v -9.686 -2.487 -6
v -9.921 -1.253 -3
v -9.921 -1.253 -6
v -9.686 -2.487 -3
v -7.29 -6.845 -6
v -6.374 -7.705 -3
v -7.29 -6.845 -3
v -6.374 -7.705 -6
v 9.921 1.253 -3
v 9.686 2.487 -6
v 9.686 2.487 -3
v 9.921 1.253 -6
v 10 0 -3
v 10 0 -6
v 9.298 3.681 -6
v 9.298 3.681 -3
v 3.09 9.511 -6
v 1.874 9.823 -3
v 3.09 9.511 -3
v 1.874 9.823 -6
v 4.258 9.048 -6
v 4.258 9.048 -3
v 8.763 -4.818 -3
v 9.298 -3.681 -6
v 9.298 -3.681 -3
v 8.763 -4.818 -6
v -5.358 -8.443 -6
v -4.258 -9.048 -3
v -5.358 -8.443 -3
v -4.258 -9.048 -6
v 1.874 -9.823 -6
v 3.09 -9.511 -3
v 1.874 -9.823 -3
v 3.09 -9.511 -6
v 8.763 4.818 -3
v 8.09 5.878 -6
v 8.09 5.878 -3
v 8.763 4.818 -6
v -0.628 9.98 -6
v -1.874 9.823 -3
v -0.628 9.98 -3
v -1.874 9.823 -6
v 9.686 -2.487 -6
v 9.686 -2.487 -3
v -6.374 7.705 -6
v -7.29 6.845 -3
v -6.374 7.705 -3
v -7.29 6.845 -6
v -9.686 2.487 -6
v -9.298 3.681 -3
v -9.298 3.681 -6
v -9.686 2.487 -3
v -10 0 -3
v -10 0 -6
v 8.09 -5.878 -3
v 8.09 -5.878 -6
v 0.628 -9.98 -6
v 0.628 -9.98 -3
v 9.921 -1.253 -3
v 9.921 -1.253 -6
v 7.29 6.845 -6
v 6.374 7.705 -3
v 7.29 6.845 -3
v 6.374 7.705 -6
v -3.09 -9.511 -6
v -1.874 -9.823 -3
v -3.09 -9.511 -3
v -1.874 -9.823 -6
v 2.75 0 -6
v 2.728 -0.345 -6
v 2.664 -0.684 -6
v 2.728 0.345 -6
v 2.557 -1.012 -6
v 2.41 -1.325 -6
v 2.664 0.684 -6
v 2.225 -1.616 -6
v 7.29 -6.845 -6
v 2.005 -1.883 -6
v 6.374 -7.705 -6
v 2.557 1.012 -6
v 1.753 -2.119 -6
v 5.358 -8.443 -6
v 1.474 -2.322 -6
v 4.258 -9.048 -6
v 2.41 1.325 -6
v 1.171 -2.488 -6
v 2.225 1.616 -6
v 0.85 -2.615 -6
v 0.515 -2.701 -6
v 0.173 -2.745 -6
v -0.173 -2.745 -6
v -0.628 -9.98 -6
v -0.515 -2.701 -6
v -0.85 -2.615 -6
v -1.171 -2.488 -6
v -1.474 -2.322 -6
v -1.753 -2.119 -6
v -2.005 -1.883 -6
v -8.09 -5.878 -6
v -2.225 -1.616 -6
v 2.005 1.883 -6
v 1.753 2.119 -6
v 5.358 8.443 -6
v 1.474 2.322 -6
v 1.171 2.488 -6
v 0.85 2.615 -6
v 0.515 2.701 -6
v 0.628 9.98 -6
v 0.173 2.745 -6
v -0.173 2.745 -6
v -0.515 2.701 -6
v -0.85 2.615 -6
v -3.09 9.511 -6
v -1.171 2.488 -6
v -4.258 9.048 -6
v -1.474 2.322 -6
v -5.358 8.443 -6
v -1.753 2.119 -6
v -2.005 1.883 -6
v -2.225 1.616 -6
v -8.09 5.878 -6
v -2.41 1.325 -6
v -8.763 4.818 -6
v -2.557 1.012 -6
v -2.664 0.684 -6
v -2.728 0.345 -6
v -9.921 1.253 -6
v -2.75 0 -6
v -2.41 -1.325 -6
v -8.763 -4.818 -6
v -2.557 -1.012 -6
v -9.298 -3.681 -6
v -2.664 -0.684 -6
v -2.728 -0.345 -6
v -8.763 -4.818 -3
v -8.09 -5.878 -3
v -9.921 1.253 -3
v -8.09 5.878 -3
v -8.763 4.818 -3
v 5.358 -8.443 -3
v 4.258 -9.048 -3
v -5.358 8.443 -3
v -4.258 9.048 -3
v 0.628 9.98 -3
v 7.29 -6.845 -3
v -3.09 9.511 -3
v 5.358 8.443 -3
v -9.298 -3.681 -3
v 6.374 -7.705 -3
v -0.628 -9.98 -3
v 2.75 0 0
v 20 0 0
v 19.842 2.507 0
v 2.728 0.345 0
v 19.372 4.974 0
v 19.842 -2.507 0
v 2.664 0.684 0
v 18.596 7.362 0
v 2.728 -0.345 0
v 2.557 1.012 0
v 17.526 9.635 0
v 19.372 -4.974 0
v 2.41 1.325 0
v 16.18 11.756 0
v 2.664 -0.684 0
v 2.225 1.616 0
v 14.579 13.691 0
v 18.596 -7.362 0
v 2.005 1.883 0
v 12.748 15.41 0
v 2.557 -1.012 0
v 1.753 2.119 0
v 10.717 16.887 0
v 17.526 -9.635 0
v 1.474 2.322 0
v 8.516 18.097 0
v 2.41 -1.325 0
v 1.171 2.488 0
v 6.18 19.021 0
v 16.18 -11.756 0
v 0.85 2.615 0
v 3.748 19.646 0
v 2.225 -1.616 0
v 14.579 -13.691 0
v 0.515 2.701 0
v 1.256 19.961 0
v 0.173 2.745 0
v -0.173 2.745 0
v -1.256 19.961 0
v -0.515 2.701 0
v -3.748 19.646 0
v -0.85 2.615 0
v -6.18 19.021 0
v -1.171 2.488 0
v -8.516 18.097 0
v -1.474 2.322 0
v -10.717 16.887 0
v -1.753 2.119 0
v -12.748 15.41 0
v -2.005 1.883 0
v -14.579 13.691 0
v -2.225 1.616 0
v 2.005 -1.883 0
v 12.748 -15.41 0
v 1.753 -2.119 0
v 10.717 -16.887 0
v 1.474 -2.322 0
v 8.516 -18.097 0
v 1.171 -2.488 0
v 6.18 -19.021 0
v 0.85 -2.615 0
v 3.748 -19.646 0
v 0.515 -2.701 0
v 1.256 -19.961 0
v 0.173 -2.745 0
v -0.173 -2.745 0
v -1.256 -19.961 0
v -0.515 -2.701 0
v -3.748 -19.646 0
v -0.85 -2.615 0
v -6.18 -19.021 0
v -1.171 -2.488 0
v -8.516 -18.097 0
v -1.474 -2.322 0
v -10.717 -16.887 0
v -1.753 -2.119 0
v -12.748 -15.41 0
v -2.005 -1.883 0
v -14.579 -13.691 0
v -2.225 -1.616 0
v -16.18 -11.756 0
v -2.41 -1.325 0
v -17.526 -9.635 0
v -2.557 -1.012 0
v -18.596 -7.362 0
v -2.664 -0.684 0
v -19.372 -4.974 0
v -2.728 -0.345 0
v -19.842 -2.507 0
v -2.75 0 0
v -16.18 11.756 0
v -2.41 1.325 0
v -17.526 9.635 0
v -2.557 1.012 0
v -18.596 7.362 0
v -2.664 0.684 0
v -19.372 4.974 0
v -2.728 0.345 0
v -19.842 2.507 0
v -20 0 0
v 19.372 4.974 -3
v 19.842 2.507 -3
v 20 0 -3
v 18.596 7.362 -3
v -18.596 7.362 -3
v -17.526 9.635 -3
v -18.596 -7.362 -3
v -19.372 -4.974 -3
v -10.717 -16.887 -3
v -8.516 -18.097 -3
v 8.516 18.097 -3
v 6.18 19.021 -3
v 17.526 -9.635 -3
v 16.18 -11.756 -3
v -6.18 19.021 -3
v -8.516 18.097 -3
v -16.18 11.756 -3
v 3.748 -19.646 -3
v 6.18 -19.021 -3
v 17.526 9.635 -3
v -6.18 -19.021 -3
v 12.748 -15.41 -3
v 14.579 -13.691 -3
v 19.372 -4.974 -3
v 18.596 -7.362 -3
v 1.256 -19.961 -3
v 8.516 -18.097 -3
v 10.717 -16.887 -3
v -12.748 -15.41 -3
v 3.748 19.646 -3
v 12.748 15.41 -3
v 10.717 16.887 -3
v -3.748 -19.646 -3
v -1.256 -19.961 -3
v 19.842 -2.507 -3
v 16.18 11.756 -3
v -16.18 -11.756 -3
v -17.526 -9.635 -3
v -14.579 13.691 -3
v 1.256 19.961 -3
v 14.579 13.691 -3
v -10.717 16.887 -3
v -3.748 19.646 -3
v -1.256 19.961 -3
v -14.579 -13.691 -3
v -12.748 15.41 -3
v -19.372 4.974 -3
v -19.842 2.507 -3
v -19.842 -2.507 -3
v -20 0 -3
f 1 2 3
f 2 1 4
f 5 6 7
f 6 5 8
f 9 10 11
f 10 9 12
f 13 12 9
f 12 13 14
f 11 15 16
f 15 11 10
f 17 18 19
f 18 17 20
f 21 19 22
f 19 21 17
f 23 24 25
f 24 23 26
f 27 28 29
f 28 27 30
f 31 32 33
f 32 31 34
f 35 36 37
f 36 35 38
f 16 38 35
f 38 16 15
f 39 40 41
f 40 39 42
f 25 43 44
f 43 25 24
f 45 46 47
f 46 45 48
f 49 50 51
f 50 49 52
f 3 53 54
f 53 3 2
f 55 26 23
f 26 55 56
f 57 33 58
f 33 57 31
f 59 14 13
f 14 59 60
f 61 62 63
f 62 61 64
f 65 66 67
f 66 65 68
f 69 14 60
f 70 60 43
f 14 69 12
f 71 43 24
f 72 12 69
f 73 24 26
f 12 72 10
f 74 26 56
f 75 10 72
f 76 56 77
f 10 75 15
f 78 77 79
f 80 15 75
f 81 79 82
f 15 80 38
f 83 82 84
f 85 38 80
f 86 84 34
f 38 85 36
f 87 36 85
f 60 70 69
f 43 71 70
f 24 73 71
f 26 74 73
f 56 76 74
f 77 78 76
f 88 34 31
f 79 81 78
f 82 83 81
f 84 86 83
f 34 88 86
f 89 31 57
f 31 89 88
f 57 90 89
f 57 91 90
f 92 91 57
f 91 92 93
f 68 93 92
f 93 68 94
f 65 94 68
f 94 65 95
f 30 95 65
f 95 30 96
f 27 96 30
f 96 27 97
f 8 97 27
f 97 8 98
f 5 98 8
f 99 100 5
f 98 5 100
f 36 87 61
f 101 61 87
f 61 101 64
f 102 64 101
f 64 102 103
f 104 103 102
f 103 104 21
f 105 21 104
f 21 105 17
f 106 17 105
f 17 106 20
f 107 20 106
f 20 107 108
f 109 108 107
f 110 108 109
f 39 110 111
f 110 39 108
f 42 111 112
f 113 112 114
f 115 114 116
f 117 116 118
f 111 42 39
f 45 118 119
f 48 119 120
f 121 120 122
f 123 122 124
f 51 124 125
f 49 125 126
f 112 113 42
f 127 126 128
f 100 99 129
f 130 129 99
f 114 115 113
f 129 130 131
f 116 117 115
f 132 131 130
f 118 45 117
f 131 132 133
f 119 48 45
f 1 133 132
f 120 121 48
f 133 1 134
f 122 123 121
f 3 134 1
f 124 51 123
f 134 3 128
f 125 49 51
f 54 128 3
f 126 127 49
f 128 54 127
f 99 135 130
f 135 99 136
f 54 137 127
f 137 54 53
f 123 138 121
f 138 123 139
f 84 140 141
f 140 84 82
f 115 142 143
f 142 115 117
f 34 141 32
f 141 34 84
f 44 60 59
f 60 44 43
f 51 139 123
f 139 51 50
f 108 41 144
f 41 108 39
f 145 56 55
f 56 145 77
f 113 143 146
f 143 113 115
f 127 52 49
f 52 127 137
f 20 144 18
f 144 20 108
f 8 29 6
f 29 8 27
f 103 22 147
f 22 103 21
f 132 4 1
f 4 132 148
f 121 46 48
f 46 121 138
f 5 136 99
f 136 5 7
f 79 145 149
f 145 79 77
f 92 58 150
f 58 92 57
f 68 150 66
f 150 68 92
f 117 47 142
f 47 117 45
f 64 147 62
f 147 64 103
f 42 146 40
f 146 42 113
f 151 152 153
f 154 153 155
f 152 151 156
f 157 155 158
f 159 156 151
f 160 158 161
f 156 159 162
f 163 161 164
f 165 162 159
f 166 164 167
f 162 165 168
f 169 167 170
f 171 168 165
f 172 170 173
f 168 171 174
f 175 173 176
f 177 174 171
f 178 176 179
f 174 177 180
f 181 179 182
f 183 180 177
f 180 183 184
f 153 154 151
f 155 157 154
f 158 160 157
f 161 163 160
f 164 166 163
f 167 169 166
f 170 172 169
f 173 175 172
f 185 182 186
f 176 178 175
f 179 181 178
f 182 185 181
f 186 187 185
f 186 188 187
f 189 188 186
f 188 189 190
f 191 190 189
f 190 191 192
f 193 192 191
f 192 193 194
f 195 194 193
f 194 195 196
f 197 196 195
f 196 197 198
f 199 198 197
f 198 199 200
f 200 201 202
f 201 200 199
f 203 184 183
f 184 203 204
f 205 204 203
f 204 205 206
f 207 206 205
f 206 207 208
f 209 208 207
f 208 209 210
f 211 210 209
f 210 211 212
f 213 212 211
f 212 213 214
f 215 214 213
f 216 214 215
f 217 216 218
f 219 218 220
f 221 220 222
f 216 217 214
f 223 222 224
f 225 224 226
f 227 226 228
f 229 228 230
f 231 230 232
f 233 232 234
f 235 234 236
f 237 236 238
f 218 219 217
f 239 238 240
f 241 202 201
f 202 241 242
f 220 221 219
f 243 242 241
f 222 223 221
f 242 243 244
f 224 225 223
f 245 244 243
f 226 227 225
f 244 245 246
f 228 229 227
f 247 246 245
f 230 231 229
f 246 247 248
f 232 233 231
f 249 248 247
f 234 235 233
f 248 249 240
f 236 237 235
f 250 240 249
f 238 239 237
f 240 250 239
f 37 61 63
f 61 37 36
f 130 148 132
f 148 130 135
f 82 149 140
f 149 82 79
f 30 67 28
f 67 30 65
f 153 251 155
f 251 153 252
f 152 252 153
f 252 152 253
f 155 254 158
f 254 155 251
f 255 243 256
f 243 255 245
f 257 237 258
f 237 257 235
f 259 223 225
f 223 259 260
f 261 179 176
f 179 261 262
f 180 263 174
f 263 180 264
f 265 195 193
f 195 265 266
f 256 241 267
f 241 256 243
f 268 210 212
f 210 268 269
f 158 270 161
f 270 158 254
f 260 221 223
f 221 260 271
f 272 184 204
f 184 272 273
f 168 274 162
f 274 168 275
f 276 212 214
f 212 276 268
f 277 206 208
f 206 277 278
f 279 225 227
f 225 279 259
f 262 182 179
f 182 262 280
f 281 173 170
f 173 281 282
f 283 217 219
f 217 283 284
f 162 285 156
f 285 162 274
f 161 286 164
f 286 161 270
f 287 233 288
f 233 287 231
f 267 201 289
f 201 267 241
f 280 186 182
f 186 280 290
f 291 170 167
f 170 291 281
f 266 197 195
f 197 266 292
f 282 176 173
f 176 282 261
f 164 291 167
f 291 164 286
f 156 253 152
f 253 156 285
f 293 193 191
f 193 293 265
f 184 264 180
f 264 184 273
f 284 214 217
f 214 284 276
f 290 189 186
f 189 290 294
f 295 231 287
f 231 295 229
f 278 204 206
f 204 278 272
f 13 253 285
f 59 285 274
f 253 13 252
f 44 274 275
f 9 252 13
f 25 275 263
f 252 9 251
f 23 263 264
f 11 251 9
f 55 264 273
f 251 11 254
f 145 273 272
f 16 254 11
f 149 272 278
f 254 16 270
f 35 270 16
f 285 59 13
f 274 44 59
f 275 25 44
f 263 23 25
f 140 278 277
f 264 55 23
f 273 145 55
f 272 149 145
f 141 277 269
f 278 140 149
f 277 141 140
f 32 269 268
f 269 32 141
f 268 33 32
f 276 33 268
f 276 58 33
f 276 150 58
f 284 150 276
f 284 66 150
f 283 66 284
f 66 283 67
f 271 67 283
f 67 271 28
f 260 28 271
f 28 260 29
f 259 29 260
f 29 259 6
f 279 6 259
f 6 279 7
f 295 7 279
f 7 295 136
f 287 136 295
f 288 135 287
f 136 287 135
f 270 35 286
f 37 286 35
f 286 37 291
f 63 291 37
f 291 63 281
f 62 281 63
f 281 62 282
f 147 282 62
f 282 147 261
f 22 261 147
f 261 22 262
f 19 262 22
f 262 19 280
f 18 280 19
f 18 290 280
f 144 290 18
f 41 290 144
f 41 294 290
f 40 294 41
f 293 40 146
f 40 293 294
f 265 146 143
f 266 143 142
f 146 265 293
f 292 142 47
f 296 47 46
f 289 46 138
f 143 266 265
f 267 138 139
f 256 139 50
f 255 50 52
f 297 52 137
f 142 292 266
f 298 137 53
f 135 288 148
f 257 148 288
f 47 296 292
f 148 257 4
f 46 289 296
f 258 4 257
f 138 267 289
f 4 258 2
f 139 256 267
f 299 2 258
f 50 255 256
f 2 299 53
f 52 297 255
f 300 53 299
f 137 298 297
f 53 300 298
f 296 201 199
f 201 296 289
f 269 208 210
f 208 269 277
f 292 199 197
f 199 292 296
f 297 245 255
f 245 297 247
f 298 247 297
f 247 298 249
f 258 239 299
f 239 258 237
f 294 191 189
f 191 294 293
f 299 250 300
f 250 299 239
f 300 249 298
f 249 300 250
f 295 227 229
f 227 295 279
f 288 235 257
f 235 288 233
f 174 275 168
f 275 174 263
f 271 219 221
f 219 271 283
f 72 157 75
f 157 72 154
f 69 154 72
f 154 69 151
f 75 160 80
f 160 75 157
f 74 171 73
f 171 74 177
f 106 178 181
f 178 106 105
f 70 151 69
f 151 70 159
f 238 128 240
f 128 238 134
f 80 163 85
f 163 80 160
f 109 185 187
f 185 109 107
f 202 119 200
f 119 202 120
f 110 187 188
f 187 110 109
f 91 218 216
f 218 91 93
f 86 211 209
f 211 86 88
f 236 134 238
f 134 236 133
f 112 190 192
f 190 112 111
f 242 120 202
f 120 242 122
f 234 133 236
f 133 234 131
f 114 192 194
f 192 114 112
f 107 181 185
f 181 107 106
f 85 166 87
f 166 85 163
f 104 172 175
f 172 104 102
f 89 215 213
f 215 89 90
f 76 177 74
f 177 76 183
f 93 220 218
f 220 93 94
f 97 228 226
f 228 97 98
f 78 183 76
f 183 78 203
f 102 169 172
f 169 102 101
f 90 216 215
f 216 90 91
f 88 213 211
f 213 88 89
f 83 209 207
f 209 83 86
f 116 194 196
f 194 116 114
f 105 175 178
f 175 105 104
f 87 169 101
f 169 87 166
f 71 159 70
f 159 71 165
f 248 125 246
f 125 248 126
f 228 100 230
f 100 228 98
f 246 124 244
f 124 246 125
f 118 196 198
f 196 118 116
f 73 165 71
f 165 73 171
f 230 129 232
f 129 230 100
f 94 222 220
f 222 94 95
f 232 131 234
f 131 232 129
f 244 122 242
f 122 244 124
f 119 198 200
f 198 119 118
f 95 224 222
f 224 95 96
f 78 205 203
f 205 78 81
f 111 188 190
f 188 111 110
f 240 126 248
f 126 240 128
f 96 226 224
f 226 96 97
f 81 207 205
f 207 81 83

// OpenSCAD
$fn = 50;


difference() {
	union() {
		translate(v = [0, 0, -6.0000000000]) {
			cylinder(h = 6, r = 10.0000000000);
		}
		translate(v = [0, 0, -3.0000000000]) {
			cylinder(h = 3, r = 20.0000000000);
		}
	}
	union() {
		#translate(v = [0, 0, -6]) {
			cylinder(h = 6, r = 2.7500000000);
		}
	}
}
